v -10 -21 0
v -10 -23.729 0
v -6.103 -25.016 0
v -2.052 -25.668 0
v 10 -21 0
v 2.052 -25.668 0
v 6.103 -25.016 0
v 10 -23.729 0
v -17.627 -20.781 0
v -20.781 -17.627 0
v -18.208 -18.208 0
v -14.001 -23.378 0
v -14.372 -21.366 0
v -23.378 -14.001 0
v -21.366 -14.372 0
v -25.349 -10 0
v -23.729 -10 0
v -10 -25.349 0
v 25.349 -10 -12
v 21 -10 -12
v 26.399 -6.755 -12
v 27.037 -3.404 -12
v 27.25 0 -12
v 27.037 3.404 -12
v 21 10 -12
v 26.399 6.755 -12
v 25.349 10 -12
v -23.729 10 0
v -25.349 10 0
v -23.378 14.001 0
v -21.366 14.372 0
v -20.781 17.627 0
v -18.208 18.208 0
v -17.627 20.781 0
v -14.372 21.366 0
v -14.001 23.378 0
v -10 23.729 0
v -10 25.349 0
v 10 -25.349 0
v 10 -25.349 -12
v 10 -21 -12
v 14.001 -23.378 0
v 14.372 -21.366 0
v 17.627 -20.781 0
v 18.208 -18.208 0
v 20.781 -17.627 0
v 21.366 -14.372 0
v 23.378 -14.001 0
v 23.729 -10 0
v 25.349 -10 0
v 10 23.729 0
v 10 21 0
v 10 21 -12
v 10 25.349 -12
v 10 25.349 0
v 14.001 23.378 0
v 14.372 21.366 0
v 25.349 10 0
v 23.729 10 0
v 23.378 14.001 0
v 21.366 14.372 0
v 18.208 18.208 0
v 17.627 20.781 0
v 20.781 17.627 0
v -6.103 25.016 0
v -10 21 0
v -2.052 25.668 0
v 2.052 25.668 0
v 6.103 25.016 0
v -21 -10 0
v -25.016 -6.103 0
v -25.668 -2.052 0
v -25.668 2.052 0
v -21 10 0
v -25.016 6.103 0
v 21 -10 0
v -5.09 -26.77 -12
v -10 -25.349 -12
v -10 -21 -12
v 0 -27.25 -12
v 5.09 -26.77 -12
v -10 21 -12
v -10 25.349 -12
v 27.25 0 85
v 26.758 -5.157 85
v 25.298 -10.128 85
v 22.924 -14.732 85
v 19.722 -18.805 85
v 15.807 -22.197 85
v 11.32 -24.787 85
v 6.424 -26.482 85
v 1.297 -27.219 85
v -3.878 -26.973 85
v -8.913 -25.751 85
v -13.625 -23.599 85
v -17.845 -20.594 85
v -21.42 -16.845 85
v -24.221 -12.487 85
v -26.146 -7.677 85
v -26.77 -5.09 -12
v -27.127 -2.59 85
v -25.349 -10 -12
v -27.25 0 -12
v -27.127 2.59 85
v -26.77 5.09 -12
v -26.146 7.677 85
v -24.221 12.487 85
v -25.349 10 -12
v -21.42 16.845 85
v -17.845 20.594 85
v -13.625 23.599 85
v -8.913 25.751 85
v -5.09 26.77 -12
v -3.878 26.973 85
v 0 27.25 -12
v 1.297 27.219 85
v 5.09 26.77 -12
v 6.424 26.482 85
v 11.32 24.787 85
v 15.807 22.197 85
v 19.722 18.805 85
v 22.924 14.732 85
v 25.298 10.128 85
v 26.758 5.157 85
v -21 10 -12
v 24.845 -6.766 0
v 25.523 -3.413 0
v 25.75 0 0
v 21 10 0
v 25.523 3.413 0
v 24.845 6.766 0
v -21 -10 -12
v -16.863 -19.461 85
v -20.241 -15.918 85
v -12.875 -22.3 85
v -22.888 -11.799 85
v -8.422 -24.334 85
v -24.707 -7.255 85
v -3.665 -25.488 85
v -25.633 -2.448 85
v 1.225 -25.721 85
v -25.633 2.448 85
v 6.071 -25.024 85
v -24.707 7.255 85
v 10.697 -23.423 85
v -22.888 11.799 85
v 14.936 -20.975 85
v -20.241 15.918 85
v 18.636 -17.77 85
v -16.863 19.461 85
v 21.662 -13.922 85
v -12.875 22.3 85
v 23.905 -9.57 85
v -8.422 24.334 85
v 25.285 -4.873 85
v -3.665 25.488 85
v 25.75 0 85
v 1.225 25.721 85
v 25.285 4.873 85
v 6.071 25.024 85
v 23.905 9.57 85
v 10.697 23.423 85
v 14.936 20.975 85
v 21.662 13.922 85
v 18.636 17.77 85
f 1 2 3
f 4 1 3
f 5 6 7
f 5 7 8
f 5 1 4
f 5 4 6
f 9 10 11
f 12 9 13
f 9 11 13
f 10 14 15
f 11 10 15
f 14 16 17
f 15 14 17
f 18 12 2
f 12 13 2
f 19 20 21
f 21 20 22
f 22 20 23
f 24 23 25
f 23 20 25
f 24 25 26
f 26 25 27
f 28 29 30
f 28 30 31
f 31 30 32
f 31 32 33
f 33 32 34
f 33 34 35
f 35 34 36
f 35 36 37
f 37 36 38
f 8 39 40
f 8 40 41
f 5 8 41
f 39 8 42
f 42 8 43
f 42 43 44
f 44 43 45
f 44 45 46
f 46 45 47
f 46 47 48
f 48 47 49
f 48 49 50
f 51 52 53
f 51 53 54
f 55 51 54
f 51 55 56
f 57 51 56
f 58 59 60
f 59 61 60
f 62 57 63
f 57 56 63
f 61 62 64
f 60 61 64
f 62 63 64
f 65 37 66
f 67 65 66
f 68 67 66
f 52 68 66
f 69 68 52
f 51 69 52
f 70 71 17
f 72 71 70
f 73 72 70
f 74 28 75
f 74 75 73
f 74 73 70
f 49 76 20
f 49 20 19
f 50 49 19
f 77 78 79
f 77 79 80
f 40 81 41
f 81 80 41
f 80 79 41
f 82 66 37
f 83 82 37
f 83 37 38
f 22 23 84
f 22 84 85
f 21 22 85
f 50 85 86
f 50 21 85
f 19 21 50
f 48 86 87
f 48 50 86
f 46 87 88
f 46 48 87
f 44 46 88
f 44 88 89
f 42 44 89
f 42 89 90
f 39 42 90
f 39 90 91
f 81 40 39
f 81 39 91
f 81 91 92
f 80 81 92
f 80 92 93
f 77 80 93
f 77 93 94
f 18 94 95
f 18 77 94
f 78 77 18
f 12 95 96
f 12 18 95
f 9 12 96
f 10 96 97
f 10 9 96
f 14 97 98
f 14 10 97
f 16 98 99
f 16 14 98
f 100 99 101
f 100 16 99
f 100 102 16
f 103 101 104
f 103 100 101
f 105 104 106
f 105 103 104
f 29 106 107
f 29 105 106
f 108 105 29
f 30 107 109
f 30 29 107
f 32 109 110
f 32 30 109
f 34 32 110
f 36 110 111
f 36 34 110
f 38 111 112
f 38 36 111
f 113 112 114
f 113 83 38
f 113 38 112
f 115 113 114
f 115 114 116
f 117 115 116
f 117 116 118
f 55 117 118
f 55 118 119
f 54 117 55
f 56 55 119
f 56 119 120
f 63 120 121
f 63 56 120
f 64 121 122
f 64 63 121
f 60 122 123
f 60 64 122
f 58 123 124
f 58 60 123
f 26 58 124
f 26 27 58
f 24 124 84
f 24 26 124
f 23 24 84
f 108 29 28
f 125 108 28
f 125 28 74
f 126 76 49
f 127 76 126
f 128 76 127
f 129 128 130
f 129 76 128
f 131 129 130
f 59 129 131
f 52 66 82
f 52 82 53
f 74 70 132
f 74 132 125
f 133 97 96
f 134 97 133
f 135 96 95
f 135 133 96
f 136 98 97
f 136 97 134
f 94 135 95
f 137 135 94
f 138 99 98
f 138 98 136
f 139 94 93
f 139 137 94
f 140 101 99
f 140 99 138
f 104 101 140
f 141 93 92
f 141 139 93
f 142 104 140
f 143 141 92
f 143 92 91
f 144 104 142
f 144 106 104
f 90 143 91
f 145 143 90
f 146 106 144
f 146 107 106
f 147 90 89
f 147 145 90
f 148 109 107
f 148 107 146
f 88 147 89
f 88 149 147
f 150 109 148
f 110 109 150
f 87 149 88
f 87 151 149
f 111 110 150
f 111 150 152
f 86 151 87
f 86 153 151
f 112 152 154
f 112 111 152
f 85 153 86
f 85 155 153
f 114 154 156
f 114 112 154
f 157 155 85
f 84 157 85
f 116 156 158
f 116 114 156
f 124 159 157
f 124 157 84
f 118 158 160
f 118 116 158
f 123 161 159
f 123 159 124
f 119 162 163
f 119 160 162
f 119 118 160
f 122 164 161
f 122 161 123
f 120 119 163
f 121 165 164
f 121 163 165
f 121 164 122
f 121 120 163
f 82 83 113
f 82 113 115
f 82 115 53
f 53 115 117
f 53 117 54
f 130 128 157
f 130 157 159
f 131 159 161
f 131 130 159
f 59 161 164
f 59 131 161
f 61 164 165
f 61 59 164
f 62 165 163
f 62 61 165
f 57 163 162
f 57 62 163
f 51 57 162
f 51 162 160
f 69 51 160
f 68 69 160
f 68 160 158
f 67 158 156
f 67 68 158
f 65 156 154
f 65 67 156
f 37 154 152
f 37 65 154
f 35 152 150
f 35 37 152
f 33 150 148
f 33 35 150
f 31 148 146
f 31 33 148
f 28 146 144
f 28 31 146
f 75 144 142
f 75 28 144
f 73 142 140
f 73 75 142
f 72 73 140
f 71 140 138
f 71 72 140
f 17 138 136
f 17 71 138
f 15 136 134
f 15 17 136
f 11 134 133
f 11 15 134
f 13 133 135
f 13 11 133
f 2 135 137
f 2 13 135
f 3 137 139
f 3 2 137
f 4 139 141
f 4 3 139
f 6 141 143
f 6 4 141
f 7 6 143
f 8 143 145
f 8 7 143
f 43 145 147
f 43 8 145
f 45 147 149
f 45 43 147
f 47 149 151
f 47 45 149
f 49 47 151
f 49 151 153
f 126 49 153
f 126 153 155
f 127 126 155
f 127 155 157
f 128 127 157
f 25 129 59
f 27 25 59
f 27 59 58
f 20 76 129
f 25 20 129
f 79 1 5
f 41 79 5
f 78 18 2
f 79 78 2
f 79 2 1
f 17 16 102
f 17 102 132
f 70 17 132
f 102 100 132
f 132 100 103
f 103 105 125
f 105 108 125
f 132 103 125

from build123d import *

# Parameters (mm, degrees)
F0_R     = 27.25
F0_R_2   = 25.75
F1_DEPTH = 85
F2_W     = 20
F2_H     = 17.491485
F2_W_2   = 14.608384
F2_H_2   = 20
F3_DEPTH = 12
F4_R     = 27.25
F5_DEPTH = 100


with BuildPart() as f1:
    # F0 (on Top) → F1 (new body)
    with BuildSketch(Plane.XY):
        Circle(F0_R)
        Circle(F0_R_2, mode=Mode.SUBTRACT)
    extrude(amount=F1_DEPTH)

    # F2 (on Top) → F3 (join)
    with BuildSketch(Plane.XY):
        with Locations((0, -29.745742)):
            Rectangle(F2_W, F2_H)
        with Locations((-28.304192, 0)):
            Rectangle(F2_W_2, F2_H_2)
        with Locations((0, 29.745742)):
            Rectangle(F2_W, F2_H)
        with Locations((28.304192, 0)):
            Rectangle(F2_W_2, F2_H_2)
    extrude(amount=-F3_DEPTH)

    # F4 (on face) → F5 (intersect, symmetric)
    with BuildSketch(Plane(origin=(0, 0, 0), x_dir=(1, 0, 0), z_dir=(0, 0, -1))):
        Circle(F4_R)
    extrude(amount=F5_DEPTH, both=True, mode=Mode.INTERSECT)


solid = f1.part
